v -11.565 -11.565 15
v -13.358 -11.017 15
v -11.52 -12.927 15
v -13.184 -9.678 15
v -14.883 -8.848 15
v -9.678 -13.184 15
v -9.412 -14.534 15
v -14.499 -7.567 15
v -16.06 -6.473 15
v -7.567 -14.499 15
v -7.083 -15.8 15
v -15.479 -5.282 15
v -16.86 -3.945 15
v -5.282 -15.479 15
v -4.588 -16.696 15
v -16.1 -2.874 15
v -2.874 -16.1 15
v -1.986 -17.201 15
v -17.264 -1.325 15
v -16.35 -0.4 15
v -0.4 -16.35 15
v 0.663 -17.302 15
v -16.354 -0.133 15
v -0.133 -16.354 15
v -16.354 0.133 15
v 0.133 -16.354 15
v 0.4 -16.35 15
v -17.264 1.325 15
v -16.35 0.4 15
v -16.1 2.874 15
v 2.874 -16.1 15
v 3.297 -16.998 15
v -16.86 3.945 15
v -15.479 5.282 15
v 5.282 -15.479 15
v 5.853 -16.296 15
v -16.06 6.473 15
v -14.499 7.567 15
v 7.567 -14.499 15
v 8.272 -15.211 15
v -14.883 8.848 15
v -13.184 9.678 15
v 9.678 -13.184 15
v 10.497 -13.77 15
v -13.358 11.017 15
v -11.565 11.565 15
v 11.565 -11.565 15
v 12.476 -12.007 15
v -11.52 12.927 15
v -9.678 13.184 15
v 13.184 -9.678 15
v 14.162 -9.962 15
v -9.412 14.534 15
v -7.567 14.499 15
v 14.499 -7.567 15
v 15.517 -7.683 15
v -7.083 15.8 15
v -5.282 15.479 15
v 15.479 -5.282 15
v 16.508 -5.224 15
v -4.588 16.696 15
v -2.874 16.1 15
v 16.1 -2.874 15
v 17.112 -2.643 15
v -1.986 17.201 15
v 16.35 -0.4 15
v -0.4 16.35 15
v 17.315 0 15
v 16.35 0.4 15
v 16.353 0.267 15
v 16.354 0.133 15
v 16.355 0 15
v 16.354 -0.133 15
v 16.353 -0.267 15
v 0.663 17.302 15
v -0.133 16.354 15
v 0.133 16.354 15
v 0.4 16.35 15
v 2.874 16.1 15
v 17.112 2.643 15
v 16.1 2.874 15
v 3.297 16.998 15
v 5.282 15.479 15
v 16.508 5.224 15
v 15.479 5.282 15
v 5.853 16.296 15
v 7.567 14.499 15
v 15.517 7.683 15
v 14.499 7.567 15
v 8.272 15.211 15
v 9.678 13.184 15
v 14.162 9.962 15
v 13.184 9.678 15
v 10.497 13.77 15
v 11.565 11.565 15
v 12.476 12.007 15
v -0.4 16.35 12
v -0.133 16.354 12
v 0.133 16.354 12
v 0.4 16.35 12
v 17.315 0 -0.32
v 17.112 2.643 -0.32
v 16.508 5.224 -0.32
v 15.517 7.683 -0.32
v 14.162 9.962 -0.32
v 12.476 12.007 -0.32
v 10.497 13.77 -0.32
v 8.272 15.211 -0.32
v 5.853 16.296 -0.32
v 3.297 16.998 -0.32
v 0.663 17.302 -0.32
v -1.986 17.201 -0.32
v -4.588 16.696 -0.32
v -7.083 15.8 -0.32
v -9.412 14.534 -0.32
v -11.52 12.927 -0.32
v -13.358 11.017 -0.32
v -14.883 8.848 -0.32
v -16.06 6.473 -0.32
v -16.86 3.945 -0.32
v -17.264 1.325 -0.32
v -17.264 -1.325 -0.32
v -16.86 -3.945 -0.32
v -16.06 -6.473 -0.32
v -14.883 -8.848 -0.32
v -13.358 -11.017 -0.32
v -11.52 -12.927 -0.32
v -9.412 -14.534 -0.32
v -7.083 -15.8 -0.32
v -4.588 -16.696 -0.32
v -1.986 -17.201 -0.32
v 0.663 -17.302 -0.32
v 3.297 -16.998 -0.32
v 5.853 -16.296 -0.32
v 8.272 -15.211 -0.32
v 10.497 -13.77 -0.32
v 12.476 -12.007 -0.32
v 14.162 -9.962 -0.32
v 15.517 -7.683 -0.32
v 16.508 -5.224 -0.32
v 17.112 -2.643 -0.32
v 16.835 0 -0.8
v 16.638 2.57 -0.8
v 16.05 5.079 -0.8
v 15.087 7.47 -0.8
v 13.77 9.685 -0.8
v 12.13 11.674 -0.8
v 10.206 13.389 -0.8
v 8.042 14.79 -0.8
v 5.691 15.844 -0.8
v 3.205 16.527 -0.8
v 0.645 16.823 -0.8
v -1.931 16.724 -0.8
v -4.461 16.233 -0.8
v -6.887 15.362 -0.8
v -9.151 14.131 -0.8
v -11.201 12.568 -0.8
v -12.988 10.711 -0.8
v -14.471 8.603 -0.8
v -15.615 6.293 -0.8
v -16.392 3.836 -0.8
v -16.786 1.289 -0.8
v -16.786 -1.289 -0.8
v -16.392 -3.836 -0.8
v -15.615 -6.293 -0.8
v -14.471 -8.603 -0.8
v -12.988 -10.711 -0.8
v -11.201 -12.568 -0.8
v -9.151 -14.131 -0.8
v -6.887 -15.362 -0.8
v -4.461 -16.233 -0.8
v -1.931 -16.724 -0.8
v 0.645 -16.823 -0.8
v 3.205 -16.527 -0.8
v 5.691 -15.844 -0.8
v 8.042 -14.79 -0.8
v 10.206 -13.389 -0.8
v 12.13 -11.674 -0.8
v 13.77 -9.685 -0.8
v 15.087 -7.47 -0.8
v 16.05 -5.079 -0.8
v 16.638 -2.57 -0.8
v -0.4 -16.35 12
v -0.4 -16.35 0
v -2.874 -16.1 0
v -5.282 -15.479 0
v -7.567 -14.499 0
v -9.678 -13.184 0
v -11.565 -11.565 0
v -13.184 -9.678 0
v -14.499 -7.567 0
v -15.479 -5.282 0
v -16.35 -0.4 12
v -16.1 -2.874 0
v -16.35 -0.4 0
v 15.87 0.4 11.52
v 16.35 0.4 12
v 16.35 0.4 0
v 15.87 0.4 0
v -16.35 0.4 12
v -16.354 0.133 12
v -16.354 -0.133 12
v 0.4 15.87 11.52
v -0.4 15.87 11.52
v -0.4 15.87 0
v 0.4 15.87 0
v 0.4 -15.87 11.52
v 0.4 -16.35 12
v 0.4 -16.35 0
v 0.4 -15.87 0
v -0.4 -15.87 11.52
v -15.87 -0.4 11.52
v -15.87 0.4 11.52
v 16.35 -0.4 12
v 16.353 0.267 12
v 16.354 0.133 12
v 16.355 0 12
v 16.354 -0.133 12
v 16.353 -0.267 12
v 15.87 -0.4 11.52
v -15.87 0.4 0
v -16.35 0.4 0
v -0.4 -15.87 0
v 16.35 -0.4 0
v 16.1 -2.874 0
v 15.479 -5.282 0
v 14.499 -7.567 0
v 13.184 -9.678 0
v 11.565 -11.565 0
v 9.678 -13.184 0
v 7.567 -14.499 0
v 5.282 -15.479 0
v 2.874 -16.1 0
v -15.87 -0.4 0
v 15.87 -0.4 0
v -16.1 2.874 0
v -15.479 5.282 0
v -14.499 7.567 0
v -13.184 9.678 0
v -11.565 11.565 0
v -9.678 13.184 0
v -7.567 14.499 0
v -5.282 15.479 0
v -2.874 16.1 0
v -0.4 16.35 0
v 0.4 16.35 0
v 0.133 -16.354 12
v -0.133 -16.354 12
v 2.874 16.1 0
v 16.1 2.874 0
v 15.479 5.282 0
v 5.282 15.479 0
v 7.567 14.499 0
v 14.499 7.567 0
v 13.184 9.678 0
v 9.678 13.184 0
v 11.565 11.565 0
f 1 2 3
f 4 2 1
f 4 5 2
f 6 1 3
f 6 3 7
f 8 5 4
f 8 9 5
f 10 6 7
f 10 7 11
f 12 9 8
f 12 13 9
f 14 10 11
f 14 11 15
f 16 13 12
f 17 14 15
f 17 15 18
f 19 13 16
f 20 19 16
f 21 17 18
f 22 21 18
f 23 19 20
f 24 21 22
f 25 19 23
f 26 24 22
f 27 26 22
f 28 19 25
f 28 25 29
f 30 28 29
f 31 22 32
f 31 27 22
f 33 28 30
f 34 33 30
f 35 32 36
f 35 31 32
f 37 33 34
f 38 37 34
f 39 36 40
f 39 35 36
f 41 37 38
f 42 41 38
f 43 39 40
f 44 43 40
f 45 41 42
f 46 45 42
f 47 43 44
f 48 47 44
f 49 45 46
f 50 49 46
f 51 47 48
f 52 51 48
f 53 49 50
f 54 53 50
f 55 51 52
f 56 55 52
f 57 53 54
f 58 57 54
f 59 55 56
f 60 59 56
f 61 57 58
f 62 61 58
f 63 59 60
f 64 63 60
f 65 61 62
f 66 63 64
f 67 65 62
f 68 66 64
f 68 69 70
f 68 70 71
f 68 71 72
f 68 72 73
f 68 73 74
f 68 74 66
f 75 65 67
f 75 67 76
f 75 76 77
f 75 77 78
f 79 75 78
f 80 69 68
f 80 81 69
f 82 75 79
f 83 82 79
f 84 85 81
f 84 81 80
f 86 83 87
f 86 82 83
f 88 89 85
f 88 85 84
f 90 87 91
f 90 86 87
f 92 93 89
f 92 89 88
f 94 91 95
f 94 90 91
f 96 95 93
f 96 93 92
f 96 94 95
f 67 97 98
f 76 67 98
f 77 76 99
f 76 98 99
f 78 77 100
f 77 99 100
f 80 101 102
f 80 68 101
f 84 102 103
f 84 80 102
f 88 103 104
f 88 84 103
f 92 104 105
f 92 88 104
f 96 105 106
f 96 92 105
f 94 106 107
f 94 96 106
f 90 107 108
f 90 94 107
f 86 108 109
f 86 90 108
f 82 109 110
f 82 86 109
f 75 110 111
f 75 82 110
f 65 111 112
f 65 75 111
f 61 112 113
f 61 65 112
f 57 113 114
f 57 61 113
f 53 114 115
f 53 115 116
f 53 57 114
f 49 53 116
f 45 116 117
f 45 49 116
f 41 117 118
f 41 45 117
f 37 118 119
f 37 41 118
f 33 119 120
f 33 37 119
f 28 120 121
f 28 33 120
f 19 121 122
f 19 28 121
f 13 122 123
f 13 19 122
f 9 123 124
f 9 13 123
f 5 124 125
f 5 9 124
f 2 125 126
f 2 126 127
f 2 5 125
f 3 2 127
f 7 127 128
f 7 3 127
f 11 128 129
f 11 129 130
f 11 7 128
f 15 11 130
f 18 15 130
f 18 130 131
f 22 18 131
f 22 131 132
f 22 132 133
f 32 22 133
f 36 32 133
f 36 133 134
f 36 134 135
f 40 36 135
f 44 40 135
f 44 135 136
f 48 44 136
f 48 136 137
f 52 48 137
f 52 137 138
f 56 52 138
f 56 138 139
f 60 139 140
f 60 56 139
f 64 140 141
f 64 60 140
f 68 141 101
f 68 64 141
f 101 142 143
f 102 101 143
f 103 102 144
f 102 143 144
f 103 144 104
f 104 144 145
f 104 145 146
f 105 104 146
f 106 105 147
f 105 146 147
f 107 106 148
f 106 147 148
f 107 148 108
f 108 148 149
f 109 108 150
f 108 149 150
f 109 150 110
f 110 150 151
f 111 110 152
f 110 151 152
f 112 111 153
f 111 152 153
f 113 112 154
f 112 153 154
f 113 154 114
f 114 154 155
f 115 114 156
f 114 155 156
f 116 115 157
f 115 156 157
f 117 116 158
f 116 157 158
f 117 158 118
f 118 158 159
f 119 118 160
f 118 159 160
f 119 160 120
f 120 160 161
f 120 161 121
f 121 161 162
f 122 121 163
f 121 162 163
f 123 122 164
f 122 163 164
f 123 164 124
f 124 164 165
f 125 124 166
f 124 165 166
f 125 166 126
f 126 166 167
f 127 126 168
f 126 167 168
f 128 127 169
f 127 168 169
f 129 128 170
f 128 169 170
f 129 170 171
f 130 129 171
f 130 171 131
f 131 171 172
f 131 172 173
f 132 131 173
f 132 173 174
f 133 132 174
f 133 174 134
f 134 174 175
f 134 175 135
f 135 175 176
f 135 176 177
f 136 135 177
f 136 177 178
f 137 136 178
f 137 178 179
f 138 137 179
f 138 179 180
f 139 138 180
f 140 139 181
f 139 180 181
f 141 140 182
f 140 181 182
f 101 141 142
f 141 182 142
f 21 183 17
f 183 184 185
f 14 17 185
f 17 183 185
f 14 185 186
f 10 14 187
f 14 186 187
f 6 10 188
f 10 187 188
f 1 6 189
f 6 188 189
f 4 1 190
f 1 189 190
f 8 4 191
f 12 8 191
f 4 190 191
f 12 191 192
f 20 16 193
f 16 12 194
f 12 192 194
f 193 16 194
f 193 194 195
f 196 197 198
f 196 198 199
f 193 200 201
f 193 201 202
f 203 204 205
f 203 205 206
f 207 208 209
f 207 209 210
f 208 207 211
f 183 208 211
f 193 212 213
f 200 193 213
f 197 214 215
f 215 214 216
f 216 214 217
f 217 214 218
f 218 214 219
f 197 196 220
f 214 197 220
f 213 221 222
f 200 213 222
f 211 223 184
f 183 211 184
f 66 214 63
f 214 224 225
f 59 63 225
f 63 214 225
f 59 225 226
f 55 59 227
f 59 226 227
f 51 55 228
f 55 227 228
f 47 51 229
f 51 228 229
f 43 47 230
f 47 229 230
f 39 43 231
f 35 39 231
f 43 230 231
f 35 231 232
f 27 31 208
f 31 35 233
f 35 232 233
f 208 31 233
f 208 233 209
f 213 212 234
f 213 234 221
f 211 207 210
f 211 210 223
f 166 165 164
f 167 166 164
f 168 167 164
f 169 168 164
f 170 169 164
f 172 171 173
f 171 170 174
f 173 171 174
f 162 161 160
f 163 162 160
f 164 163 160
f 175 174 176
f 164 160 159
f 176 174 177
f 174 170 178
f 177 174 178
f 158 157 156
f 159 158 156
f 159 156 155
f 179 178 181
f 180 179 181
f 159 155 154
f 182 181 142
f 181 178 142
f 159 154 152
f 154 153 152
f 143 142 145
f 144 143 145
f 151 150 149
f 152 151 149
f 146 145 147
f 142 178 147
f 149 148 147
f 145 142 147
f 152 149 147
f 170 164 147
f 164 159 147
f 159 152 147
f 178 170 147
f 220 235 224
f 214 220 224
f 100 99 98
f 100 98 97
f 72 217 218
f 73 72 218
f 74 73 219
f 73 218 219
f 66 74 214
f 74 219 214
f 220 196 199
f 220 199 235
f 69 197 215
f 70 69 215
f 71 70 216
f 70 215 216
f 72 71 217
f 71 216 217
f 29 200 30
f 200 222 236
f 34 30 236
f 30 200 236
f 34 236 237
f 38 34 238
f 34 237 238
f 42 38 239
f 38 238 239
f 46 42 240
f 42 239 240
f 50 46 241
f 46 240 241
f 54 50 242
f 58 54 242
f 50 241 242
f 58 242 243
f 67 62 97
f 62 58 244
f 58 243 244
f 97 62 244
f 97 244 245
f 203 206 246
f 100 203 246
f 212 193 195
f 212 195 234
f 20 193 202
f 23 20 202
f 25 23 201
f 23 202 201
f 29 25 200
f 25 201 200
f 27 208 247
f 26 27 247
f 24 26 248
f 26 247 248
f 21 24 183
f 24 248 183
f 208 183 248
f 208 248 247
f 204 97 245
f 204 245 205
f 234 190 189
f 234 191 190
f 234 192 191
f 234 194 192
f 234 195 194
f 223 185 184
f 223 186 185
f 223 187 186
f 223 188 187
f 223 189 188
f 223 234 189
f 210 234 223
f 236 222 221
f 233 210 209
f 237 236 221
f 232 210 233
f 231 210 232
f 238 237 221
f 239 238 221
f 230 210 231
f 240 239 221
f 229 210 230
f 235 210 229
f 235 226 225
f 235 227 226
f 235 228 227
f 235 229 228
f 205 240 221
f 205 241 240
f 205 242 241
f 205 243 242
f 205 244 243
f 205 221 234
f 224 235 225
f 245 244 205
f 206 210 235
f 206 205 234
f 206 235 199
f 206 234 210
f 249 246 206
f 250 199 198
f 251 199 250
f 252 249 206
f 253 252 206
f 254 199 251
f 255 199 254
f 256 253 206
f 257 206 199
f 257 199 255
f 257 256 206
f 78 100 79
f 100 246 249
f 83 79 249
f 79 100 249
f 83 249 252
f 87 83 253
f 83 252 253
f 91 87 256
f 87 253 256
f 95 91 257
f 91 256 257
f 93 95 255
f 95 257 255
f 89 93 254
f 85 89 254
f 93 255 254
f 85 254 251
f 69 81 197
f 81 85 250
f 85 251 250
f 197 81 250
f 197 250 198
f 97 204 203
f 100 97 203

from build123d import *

# Parameters (mm, degrees)
F1_R     = 17.315
F2_DEPTH = 0.8
F3_DEPTH = 15
F4_DEPTH = 12
F5_SIZE  = 0.48
F6_SIZE  = 0.48


with BuildPart() as f2:
    # F1 (on Top) → F2 (new body)
    with BuildSketch(Plane.XY):
        Circle(F1_R)
        with BuildLine():
            ThreePointArc((16.3501077978, 0.4), (16.3537769037, 0.200014958), (16.355, 0))
            ThreePointArc((16.355, 0), (16.3537769037, -0.200014958), (16.3501077978, -0.4))
            ThreePointArc((16.3501077978, -0.4), (11.5647314063, -11.5647314063), (0.4, -16.3501077978))
            ThreePointArc((0.4, -16.3501077978), (0, -16.355), (-0.4, -16.3501077978))
            ThreePointArc((-0.4, -16.3501077978), (-11.5647314063, -11.5647314063), (-16.3501077978, -0.4))
            ThreePointArc((-16.3501077978, -0.4), (-16.355, 0), (-16.3501077978, 0.4))
            ThreePointArc((-16.3501077978, 0.4), (-11.5647314063, 11.5647314063), (-0.4, 16.3501077978))
            ThreePointArc((-0.4, 16.3501077978), (0, 16.355), (0.4, 16.3501077978))
            ThreePointArc((0.4, 16.3501077978), (11.5647314063, 11.5647314063), (16.3501077978, 0.4))
        make_face(mode=Mode.SUBTRACT)
        with BuildLine():
            Line((15.8699598298, 0.4), (16.3501077978, 0.4))
            ThreePointArc((16.3501077978, 0.4), (11.5647314063, 11.5647314063), (0.4, 16.3501077978))
            Line((0.4, 16.3501077978), (0.4, 15.8699598298))
            Line((0.4, 15.8699598298), (-0.4, 15.8699598298))
            Line((-0.4, 15.8699598298), (-0.4, 16.3501077978))
            ThreePointArc((-0.4, 16.3501077978), (-11.5647314063, 11.5647314063), (-16.3501077978, 0.4))
            Line((-16.3501077978, 0.4), (-15.8699598298, 0.4))
            Line((-15.8699598298, 0.4), (-15.8699598298, -0.4))
            Line((-15.8699598298, -0.4), (-16.3501077978, -0.4))
            ThreePointArc((-16.3501077978, -0.4), (-11.5647314063, -11.5647314063), (-0.4, -16.3501077978))
            Line((-0.4, -16.3501077978), (-0.4, -15.8699598298))
            Line((-0.4, -15.8699598298), (0.4, -15.8699598298))
            Line((0.4, -15.8699598298), (0.4, -16.3501077978))
            ThreePointArc((0.4, -16.3501077978), (11.5647314063, -11.5647314063), (16.3501077978, -0.4))
            Line((16.3501077978, -0.4), (15.8699598298, -0.4))
            Line((15.8699598298, -0.4), (15.8699598298, 0.4))
        make_face()
        with BuildLine():
            Line((-15.8699598298, 0.4), (-16.3501077978, 0.4))
            ThreePointArc((-16.3501077978, 0.4), (-16.355, 0), (-16.3501077978, -0.4))
            Line((-16.3501077978, -0.4), (-15.8699598298, -0.4))
            Line((-15.8699598298, -0.4), (-15.8699598298, 0.4))
        make_face()
        with BuildLine():
            ThreePointArc((-0.4, -16.3501077978), (0, -16.355), (0.4, -16.3501077978))
            Line((0.4, -16.3501077978), (0.4, -15.8699598298))
            Line((0.4, -15.8699598298), (-0.4, -15.8699598298))
            Line((-0.4, -15.8699598298), (-0.4, -16.3501077978))
        make_face()
        with BuildLine():
            ThreePointArc((16.3501077978, -0.4), (16.3537769037, -0.200014958), (16.355, 0))
            ThreePointArc((16.355, 0), (16.3537769037, 0.200014958), (16.3501077978, 0.4))
            Line((16.3501077978, 0.4), (15.8699598298, 0.4))
            Line((15.8699598298, 0.4), (15.8699598298, -0.4))
            Line((15.8699598298, -0.4), (16.3501077978, -0.4))
        make_face()
        with BuildLine():
            Line((0.4, 15.8699598298), (0.4, 16.3501077978))
            ThreePointArc((0.4, 16.3501077978), (0, 16.355), (-0.4, 16.3501077978))
            Line((-0.4, 16.3501077978), (-0.4, 15.8699598298))
            Line((-0.4, 15.8699598298), (0.4, 15.8699598298))
        make_face()
    extrude(amount=-F2_DEPTH)

    # F1 (on Top) → F3 (join)
    with BuildSketch(Plane.XY):
        Circle(F1_R)
        with BuildLine():
            ThreePointArc((16.3501077978, 0.4), (16.3537769037, 0.200014958), (16.355, 0))
            ThreePointArc((16.355, 0), (16.3537769037, -0.200014958), (16.3501077978, -0.4))
            ThreePointArc((16.3501077978, -0.4), (11.5647314063, -11.5647314063), (0.4, -16.3501077978))
            ThreePointArc((0.4, -16.3501077978), (0, -16.355), (-0.4, -16.3501077978))
            ThreePointArc((-0.4, -16.3501077978), (-11.5647314063, -11.5647314063), (-16.3501077978, -0.4))
            ThreePointArc((-16.3501077978, -0.4), (-16.355, 0), (-16.3501077978, 0.4))
            ThreePointArc((-16.3501077978, 0.4), (-11.5647314063, 11.5647314063), (-0.4, 16.3501077978))
            ThreePointArc((-0.4, 16.3501077978), (0, 16.355), (0.4, 16.3501077978))
            ThreePointArc((0.4, 16.3501077978), (11.5647314063, 11.5647314063), (16.3501077978, 0.4))
        make_face(mode=Mode.SUBTRACT)
    extrude(amount=F3_DEPTH)

    # F1 (on Top) → F4 (join)
    with BuildSketch(Plane.XY):
        with BuildLine():
            Line((0.4, 15.8699598298), (0.4, 16.3501077978))
            ThreePointArc((0.4, 16.3501077978), (0, 16.355), (-0.4, 16.3501077978))
            Line((-0.4, 16.3501077978), (-0.4, 15.8699598298))
            Line((-0.4, 15.8699598298), (0.4, 15.8699598298))
        make_face()
        with BuildLine():
            Line((-15.8699598298, 0.4), (-16.3501077978, 0.4))
            ThreePointArc((-16.3501077978, 0.4), (-16.355, 0), (-16.3501077978, -0.4))
            Line((-16.3501077978, -0.4), (-15.8699598298, -0.4))
            Line((-15.8699598298, -0.4), (-15.8699598298, 0.4))
        make_face()
        with BuildLine():
            ThreePointArc((16.3501077978, -0.4), (16.3537769037, -0.200014958), (16.355, 0))
            ThreePointArc((16.355, 0), (16.3537769037, 0.200014958), (16.3501077978, 0.4))
            Line((16.3501077978, 0.4), (15.8699598298, 0.4))
            Line((15.8699598298, 0.4), (15.8699598298, -0.4))
            Line((15.8699598298, -0.4), (16.3501077978, -0.4))
        make_face()
        with BuildLine():
            ThreePointArc((-0.4, -16.3501077978), (0, -16.355), (0.4, -16.3501077978))
            Line((0.4, -16.3501077978), (0.4, -15.8699598298))
            Line((0.4, -15.8699598298), (-0.4, -15.8699598298))
            Line((-0.4, -15.8699598298), (-0.4, -16.3501077978))
        make_face()
    extrude(amount=F4_DEPTH)

    # F5
    f5_edges = [f2.edges().sort_by_distance(p)[0] for p in [
        (-17.315, 0, -0.8),
    ]]
    chamfer(f5_edges, length=F5_SIZE)

    # F6
    f6_edges = [f2.edges().sort_by_distance(p)[0] for p in [
        (-15.86996, 0, 12),
        (0, 15.86996, 12),
        (15.86996, 0, 12),
        (0, -15.86996, 12),
    ]]
    chamfer(f6_edges, length=F6_SIZE)


solid = f2.part
